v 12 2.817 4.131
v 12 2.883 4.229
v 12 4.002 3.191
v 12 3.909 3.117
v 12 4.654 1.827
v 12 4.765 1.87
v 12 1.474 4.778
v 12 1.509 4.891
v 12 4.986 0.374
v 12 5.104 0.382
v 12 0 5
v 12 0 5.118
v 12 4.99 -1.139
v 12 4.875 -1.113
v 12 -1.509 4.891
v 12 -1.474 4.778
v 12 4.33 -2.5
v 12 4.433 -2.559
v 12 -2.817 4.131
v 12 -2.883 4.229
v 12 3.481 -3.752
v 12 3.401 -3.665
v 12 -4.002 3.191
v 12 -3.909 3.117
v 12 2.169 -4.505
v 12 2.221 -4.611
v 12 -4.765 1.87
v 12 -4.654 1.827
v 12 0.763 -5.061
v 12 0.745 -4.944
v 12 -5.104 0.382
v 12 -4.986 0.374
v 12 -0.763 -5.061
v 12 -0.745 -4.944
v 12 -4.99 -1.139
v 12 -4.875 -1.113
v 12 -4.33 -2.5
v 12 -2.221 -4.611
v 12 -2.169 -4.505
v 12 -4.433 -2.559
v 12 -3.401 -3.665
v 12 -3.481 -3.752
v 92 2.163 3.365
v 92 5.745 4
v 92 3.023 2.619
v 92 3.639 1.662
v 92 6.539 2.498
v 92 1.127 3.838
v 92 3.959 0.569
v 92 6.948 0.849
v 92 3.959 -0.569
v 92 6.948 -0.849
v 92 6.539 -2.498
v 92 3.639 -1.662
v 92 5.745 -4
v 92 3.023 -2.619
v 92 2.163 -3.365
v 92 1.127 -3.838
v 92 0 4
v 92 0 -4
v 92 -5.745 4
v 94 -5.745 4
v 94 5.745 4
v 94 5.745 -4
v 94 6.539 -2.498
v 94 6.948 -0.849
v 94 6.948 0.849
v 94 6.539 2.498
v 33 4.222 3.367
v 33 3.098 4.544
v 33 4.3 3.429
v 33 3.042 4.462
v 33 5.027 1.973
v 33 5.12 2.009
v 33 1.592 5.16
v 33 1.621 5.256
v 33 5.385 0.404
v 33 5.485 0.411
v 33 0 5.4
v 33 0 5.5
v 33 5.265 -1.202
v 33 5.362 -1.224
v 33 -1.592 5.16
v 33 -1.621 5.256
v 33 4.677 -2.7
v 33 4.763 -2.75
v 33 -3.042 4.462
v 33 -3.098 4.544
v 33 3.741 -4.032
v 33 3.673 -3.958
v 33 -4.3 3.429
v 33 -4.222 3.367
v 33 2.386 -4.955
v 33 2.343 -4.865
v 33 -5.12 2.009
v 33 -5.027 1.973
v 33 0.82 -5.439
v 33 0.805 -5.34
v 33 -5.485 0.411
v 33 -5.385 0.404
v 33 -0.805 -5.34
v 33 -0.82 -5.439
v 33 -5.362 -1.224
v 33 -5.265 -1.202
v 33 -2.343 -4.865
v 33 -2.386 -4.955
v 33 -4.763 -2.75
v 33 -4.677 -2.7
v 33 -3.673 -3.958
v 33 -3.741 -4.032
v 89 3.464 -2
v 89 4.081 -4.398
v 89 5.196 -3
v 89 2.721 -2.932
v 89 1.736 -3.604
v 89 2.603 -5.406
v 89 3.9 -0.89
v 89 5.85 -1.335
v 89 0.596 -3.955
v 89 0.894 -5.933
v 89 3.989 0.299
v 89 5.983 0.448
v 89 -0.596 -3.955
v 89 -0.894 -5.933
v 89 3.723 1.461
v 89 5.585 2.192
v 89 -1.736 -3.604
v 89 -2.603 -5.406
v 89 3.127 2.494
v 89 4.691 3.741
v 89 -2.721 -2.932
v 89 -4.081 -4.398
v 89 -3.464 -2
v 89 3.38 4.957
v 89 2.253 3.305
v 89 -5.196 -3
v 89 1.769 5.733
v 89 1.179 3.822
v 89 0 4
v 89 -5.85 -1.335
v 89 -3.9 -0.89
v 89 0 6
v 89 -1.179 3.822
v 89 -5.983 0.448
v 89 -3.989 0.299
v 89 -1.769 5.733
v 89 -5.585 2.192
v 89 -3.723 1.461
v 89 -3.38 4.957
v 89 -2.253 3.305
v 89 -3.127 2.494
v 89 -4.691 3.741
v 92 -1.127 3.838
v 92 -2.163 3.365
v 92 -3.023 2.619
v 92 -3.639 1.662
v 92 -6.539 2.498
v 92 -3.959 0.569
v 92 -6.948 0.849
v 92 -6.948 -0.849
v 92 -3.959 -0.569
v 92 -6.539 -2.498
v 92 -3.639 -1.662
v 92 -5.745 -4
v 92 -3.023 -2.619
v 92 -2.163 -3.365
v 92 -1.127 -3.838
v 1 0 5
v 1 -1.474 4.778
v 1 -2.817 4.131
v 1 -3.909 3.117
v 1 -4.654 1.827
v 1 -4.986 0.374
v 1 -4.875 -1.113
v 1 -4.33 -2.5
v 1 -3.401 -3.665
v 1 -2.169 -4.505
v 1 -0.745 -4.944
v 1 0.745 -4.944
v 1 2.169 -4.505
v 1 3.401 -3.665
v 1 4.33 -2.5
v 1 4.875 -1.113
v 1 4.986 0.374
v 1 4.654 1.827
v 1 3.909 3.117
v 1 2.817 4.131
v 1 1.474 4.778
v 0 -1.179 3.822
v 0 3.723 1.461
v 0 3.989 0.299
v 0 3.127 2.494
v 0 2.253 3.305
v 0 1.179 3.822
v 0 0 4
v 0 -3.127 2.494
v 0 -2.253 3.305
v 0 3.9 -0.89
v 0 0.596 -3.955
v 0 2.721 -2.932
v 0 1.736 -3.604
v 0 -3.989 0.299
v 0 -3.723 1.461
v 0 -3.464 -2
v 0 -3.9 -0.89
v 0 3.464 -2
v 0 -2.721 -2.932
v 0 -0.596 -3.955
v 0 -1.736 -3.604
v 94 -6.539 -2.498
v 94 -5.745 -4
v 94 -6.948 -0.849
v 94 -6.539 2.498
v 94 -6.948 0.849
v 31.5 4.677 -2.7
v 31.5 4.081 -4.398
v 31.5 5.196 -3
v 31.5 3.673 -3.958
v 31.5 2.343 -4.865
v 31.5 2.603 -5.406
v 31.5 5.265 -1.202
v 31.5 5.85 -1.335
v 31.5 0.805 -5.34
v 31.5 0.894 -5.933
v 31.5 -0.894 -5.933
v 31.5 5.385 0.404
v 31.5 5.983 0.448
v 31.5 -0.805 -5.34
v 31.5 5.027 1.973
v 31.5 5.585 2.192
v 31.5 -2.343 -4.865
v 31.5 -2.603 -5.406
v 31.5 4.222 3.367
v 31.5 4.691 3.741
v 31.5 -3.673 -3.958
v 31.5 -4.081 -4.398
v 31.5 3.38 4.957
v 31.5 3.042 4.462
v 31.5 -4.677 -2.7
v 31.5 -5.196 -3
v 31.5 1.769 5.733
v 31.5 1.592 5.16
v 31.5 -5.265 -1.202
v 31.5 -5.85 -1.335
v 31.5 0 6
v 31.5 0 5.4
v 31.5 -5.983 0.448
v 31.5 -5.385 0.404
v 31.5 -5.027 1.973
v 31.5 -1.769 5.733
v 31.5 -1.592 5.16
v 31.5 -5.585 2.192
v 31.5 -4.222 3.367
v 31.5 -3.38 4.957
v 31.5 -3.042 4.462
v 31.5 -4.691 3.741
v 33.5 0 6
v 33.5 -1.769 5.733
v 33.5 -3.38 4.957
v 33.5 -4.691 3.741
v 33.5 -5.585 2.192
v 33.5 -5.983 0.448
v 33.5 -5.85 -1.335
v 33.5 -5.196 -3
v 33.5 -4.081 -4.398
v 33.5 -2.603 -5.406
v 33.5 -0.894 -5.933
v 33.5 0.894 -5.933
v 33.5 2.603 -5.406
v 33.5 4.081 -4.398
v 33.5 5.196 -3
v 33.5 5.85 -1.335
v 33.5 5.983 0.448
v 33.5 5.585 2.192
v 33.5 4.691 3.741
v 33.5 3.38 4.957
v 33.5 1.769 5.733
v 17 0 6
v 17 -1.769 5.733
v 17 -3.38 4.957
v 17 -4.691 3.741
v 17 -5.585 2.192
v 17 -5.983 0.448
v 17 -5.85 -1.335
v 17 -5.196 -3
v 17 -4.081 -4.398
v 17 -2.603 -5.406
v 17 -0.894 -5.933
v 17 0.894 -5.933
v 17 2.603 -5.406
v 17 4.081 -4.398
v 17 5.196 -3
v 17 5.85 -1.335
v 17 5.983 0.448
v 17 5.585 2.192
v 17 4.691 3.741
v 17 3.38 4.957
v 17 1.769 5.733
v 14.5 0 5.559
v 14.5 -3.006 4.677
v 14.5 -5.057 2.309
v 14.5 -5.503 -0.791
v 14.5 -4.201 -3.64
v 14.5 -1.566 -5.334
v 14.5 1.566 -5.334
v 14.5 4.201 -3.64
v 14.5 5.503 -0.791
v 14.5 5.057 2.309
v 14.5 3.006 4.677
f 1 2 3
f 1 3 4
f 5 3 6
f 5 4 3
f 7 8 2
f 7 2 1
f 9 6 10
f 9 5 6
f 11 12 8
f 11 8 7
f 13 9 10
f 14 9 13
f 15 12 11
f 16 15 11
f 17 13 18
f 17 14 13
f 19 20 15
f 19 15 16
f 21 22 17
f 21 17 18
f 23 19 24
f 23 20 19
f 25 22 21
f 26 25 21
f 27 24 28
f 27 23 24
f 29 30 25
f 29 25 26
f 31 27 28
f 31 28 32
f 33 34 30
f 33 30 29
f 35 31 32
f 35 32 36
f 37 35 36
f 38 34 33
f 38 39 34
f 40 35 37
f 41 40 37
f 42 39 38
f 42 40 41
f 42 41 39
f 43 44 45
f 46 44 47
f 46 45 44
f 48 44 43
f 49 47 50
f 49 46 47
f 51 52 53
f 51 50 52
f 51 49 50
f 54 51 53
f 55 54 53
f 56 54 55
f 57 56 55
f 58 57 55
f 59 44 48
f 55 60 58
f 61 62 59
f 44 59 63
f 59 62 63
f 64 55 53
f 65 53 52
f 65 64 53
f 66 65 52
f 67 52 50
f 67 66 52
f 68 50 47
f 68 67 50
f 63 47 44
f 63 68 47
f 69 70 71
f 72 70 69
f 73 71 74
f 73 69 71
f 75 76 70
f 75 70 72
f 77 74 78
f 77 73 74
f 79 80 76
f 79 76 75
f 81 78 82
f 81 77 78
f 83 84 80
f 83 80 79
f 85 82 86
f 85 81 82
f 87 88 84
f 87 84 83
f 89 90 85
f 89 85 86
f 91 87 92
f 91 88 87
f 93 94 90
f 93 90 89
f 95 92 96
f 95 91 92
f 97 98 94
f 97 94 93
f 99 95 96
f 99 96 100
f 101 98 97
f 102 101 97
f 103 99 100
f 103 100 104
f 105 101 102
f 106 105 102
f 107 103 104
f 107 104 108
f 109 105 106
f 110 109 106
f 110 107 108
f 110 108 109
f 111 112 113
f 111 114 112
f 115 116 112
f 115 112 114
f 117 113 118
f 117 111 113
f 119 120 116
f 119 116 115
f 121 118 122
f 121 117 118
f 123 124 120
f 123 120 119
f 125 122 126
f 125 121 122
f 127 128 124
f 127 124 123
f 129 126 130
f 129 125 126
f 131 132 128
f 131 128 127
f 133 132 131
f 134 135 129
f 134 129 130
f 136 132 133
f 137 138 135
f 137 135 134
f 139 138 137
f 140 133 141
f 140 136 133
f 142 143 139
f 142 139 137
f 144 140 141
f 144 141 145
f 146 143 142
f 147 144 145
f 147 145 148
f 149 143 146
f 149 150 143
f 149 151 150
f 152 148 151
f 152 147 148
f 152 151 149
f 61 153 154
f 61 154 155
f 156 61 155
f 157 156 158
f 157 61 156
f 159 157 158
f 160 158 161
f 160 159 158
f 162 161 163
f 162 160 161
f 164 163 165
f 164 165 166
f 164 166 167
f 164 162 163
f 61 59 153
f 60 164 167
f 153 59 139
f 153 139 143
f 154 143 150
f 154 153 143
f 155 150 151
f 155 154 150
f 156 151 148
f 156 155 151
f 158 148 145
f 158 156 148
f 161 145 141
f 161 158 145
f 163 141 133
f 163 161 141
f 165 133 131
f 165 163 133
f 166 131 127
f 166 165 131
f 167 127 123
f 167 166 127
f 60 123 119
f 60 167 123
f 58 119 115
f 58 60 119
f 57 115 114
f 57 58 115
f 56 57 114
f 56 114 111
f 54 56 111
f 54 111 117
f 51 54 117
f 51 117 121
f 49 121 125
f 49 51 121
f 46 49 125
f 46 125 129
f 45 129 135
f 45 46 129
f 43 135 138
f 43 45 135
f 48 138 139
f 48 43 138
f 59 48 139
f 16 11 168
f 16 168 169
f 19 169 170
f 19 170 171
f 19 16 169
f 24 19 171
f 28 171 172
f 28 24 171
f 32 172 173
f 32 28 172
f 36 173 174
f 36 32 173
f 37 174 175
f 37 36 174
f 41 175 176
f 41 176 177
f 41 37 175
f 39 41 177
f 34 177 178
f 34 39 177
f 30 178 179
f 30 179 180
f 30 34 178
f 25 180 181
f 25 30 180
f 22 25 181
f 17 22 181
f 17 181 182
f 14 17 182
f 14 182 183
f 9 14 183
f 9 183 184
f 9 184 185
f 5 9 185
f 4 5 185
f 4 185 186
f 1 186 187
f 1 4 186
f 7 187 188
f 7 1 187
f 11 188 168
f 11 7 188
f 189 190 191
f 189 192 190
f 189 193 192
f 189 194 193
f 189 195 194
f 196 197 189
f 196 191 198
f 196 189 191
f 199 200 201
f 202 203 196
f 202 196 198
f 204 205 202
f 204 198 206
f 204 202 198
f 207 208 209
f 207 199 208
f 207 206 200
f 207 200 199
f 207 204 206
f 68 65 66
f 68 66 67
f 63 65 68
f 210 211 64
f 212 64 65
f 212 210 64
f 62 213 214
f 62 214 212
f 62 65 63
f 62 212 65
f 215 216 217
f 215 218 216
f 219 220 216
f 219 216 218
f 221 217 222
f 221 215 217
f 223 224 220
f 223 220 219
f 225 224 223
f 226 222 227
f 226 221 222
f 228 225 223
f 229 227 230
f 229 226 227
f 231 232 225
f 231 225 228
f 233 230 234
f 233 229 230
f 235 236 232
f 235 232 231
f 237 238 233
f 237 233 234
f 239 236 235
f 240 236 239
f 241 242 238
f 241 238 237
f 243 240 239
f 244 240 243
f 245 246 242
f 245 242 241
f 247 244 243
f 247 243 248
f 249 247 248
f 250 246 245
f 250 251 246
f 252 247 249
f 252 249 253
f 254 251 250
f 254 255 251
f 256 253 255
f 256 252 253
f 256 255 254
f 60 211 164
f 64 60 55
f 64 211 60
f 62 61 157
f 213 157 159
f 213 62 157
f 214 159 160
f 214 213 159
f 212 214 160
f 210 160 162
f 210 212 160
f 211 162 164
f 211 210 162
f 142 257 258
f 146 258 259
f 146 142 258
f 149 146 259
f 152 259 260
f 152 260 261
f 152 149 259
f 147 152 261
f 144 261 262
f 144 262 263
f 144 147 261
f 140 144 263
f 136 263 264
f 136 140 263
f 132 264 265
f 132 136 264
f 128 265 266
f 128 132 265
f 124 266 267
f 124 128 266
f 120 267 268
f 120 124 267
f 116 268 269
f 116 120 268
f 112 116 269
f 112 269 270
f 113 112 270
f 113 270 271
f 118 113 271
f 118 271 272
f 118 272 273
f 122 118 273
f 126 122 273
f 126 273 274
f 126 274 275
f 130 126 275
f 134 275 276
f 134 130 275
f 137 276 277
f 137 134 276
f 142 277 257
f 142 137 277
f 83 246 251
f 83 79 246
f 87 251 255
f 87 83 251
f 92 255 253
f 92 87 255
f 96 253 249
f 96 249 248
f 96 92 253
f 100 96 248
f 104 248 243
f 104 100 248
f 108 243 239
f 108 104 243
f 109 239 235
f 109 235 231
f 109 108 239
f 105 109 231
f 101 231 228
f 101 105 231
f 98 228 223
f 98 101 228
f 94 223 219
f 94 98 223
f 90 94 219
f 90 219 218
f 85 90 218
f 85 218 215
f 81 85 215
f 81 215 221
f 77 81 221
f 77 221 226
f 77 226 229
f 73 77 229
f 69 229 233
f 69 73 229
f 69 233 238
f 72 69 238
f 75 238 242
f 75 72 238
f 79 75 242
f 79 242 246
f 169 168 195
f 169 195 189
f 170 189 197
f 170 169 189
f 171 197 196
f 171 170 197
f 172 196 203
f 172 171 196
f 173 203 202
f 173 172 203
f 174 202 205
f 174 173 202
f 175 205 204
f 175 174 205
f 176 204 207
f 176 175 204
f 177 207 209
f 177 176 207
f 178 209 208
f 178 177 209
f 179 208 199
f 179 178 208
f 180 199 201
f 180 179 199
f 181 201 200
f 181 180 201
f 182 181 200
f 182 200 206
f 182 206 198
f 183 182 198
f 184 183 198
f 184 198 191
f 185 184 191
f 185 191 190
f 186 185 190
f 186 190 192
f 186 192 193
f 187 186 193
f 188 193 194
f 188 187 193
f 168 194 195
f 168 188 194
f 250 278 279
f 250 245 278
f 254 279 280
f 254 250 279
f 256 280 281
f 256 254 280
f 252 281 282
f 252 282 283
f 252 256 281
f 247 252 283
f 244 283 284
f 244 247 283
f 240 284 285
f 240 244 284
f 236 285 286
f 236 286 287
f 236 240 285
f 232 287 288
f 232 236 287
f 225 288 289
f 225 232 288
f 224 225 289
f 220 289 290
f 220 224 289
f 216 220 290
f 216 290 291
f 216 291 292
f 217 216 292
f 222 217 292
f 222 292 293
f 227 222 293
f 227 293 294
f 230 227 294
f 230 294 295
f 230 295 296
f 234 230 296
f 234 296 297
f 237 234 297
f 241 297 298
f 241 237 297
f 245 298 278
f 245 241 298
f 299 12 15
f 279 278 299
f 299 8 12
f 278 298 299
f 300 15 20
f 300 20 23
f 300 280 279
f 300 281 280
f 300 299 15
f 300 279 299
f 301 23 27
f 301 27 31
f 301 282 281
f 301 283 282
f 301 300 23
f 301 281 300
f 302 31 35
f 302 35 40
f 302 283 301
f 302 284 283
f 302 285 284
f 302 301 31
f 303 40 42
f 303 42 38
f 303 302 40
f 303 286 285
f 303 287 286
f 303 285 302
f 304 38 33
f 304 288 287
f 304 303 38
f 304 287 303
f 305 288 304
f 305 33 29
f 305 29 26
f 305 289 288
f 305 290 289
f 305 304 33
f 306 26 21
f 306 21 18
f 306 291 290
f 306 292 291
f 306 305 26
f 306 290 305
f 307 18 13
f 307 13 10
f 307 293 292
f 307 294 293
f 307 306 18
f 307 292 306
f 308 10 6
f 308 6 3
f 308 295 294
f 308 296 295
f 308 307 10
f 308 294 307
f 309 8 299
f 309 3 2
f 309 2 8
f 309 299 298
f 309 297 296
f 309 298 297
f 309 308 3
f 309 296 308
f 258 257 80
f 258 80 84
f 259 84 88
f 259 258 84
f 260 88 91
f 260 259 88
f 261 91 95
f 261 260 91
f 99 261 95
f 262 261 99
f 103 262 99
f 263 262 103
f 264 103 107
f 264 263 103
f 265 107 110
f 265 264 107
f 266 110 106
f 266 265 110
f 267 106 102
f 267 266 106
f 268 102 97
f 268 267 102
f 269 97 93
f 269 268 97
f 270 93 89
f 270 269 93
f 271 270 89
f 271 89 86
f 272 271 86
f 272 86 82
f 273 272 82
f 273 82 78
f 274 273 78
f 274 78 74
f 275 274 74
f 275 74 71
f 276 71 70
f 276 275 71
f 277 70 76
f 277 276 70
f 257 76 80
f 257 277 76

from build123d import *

# Parameters (mm, degrees)
CHANFREIN1_SIZE         = 1
CHANFREIN2_SIZE         = 0.5
ENL_V_MAT_EXTRU_1_REACH = 96.52
ESQUISSE2_W             = 5.137351374
ESQUISSE2_H             = 15.268552686


with BuildPart() as part:
    # Esquisse1 → Révolution1 (revolve)
    with BuildSketch(Plane.XY, mode=Mode.PRIVATE) as r_volution1_sk:
        Polygon((0, 0), (0, 5), (12, 5), (12, 5.118365096), (17, 6), (31.5, 6), (31.5, 5.4), (33, 5.4), (33, 6), (89, 6), (89, 4), (92, 4), (92, 7), (94, 7), (94, 0), align=None)
    revolve(r_volution1_sk.sketch.rotate(Axis((0, 0, 0), (1, 0, 0)), 90), axis=Axis((0, 0, 0), (1, 0, 0)))

    # Chanfrein1
    chanfrein1_edges = [part.edges().sort_by_distance(p)[0] for p in [
        (0, 0, -5),
    ]]
    chamfer(chanfrein1_edges, length=CHANFREIN1_SIZE)

    # Chanfrein2
    chanfrein2_edges = [part.edges().sort_by_distance(p)[0] for p in [
        (33, 0, -6),
    ]]
    chamfer(chanfrein2_edges, length=CHANFREIN2_SIZE)

    # Esquisse2 → Enlèv. mat.-Extru.1 (cut, up to next)
    with BuildSketch(Plane(origin=(94, 0, 0), x_dir=(0, 0, -1), z_dir=(1, 0, 0)), mode=Mode.PRIVATE) as enl_v_mat_extru_1_sk1:
        with Locations((-6.568675687, -0.086100861)):
            Rectangle(ESQUISSE2_W, ESQUISSE2_H)
    enl_v_mat_extru_1_tool1 = extrude(enl_v_mat_extru_1_sk1.sketch, amount=-ENL_V_MAT_EXTRU_1_REACH, mode=Mode.PRIVATE) & part.part
    # Esquisse2 → Enlèv. mat.-Extru.1 (cut, up to next)
    with BuildSketch(Plane(origin=(94, 0, 0), x_dir=(0, 0, -1), z_dir=(1, 0, 0)), mode=Mode.PRIVATE) as enl_v_mat_extru_1_sk2:
        with Locations((6.568675687, -0.086100861)):
            Rectangle(ESQUISSE2_W, ESQUISSE2_H)
    enl_v_mat_extru_1_tool2 = extrude(enl_v_mat_extru_1_sk2.sketch, amount=-ENL_V_MAT_EXTRU_1_REACH, mode=Mode.PRIVATE) & part.part
    add(enl_v_mat_extru_1_tool1.solids().sort_by_distance((94, -0.086101, 6.568676))[0], mode=Mode.SUBTRACT)
    add(enl_v_mat_extru_1_tool2.solids().sort_by_distance((94, -0.086101, -6.568676))[0], mode=Mode.SUBTRACT)


solid = part.part
